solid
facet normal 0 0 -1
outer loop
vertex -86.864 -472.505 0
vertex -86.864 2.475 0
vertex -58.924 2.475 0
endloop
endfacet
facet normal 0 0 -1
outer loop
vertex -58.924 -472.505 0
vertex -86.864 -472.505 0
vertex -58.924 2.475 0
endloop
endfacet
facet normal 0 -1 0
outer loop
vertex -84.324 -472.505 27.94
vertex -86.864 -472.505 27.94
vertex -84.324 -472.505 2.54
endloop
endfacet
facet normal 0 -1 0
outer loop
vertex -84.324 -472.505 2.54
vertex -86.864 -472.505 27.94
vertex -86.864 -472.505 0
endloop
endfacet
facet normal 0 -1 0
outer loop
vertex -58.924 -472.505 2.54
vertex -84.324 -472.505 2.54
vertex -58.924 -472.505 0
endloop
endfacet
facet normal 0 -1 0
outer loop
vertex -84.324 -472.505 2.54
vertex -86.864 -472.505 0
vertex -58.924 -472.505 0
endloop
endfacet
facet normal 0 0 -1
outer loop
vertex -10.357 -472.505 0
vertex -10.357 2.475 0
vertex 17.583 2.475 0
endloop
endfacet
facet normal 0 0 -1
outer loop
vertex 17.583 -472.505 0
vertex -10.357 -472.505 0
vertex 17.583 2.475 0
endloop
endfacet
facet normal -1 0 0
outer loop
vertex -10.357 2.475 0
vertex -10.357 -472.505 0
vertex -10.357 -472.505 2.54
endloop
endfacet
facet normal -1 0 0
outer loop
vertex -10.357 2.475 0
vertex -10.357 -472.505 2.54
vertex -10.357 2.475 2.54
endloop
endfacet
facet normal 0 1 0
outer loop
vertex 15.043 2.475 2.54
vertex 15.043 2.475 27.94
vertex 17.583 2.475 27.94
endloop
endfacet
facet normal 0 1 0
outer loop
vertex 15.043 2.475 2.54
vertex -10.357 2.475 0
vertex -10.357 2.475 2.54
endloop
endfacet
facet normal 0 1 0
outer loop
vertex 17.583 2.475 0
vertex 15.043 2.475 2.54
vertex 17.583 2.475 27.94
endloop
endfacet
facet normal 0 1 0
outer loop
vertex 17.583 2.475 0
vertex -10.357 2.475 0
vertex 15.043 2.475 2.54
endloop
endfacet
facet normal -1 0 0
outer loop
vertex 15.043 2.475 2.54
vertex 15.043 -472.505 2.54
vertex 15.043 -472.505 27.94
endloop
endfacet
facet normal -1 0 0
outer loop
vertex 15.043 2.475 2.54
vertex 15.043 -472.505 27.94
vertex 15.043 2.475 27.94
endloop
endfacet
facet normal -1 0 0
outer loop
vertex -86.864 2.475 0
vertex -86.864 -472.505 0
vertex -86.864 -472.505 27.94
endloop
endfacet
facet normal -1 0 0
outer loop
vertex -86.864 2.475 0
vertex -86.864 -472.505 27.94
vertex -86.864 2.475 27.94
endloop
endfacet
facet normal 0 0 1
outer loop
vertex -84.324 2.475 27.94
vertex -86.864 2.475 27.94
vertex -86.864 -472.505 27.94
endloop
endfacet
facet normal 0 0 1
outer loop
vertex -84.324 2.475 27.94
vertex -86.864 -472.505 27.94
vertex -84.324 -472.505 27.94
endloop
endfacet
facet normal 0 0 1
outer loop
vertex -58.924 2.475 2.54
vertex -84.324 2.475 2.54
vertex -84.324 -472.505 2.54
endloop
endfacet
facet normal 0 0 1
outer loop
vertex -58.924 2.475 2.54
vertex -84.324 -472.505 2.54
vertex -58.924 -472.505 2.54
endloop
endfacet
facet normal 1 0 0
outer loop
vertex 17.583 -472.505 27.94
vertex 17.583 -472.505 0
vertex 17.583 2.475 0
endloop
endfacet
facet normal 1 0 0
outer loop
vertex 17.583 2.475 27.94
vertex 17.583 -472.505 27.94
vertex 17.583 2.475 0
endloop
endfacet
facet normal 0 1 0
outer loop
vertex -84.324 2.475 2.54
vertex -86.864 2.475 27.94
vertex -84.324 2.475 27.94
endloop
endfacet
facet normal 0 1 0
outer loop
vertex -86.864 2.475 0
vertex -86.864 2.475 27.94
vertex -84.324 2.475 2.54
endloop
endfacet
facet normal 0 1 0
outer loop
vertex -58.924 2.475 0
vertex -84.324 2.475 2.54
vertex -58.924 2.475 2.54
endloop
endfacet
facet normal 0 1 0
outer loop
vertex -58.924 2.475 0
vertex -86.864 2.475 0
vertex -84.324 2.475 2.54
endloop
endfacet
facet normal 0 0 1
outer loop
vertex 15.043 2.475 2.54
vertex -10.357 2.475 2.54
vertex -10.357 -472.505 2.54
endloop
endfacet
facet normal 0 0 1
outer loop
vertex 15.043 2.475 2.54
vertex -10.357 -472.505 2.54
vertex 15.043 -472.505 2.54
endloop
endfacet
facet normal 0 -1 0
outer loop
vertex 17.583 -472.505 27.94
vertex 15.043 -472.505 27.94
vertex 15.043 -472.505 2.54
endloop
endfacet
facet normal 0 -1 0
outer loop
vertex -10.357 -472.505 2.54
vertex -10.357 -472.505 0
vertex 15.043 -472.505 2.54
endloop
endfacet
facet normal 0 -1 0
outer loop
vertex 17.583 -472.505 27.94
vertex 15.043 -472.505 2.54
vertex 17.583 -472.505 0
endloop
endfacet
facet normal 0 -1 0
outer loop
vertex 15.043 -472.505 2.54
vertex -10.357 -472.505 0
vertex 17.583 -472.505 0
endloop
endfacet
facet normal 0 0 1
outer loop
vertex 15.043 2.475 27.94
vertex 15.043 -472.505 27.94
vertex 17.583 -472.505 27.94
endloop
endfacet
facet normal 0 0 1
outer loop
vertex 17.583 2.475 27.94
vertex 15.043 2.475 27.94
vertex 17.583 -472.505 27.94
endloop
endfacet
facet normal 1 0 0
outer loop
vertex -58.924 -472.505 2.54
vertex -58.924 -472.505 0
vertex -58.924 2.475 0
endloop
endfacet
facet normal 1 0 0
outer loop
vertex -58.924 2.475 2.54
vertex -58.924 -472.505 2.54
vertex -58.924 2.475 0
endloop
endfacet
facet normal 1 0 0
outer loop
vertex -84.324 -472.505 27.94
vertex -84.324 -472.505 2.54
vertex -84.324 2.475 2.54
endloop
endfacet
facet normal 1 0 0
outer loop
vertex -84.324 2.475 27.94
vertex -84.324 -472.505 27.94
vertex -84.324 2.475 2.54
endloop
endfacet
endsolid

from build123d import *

# Parameters (mm, degrees)
F0_W     = 25.4
F0_H     = 474.98
F1_DEPTH = 2.54
F2_W     = 2.54
F2_H     = 474.98
F3_DEPTH = 27.94


with BuildPart() as f1:
    # F0 (on Top) → F1 (new body)
    with BuildSketch(Plane.XY):
        with Locations((-71.6243397117, -235.0153012371)):
            Rectangle(F0_W, F0_H)
    extrude(amount=F1_DEPTH)

    # F2 (on Top) → F3 (join)
    with BuildSketch(Plane.XY):
        with Locations((-85.5943397117, -235.0153012371)):
            Rectangle(F2_W, F2_H)
    extrude(amount=F3_DEPTH)


with BuildPart() as f1b:
    # F0 (on Top) → F1, piece 2 (new body)
    with BuildSketch(Plane.XY):
        with Locations((2.3429441869, -235.0153012371)):
            Rectangle(F0_W, F0_H)
    extrude(amount=F1_DEPTH)

    # F2 (on Top) → F3, piece 2 (join)
    with BuildSketch(Plane.XY):
        with Locations((16.3129441869, -235.0153012371)):
            Rectangle(F2_W, F2_H)
    extrude(amount=F3_DEPTH)


solid = Compound([f1.part, f1b.part])
